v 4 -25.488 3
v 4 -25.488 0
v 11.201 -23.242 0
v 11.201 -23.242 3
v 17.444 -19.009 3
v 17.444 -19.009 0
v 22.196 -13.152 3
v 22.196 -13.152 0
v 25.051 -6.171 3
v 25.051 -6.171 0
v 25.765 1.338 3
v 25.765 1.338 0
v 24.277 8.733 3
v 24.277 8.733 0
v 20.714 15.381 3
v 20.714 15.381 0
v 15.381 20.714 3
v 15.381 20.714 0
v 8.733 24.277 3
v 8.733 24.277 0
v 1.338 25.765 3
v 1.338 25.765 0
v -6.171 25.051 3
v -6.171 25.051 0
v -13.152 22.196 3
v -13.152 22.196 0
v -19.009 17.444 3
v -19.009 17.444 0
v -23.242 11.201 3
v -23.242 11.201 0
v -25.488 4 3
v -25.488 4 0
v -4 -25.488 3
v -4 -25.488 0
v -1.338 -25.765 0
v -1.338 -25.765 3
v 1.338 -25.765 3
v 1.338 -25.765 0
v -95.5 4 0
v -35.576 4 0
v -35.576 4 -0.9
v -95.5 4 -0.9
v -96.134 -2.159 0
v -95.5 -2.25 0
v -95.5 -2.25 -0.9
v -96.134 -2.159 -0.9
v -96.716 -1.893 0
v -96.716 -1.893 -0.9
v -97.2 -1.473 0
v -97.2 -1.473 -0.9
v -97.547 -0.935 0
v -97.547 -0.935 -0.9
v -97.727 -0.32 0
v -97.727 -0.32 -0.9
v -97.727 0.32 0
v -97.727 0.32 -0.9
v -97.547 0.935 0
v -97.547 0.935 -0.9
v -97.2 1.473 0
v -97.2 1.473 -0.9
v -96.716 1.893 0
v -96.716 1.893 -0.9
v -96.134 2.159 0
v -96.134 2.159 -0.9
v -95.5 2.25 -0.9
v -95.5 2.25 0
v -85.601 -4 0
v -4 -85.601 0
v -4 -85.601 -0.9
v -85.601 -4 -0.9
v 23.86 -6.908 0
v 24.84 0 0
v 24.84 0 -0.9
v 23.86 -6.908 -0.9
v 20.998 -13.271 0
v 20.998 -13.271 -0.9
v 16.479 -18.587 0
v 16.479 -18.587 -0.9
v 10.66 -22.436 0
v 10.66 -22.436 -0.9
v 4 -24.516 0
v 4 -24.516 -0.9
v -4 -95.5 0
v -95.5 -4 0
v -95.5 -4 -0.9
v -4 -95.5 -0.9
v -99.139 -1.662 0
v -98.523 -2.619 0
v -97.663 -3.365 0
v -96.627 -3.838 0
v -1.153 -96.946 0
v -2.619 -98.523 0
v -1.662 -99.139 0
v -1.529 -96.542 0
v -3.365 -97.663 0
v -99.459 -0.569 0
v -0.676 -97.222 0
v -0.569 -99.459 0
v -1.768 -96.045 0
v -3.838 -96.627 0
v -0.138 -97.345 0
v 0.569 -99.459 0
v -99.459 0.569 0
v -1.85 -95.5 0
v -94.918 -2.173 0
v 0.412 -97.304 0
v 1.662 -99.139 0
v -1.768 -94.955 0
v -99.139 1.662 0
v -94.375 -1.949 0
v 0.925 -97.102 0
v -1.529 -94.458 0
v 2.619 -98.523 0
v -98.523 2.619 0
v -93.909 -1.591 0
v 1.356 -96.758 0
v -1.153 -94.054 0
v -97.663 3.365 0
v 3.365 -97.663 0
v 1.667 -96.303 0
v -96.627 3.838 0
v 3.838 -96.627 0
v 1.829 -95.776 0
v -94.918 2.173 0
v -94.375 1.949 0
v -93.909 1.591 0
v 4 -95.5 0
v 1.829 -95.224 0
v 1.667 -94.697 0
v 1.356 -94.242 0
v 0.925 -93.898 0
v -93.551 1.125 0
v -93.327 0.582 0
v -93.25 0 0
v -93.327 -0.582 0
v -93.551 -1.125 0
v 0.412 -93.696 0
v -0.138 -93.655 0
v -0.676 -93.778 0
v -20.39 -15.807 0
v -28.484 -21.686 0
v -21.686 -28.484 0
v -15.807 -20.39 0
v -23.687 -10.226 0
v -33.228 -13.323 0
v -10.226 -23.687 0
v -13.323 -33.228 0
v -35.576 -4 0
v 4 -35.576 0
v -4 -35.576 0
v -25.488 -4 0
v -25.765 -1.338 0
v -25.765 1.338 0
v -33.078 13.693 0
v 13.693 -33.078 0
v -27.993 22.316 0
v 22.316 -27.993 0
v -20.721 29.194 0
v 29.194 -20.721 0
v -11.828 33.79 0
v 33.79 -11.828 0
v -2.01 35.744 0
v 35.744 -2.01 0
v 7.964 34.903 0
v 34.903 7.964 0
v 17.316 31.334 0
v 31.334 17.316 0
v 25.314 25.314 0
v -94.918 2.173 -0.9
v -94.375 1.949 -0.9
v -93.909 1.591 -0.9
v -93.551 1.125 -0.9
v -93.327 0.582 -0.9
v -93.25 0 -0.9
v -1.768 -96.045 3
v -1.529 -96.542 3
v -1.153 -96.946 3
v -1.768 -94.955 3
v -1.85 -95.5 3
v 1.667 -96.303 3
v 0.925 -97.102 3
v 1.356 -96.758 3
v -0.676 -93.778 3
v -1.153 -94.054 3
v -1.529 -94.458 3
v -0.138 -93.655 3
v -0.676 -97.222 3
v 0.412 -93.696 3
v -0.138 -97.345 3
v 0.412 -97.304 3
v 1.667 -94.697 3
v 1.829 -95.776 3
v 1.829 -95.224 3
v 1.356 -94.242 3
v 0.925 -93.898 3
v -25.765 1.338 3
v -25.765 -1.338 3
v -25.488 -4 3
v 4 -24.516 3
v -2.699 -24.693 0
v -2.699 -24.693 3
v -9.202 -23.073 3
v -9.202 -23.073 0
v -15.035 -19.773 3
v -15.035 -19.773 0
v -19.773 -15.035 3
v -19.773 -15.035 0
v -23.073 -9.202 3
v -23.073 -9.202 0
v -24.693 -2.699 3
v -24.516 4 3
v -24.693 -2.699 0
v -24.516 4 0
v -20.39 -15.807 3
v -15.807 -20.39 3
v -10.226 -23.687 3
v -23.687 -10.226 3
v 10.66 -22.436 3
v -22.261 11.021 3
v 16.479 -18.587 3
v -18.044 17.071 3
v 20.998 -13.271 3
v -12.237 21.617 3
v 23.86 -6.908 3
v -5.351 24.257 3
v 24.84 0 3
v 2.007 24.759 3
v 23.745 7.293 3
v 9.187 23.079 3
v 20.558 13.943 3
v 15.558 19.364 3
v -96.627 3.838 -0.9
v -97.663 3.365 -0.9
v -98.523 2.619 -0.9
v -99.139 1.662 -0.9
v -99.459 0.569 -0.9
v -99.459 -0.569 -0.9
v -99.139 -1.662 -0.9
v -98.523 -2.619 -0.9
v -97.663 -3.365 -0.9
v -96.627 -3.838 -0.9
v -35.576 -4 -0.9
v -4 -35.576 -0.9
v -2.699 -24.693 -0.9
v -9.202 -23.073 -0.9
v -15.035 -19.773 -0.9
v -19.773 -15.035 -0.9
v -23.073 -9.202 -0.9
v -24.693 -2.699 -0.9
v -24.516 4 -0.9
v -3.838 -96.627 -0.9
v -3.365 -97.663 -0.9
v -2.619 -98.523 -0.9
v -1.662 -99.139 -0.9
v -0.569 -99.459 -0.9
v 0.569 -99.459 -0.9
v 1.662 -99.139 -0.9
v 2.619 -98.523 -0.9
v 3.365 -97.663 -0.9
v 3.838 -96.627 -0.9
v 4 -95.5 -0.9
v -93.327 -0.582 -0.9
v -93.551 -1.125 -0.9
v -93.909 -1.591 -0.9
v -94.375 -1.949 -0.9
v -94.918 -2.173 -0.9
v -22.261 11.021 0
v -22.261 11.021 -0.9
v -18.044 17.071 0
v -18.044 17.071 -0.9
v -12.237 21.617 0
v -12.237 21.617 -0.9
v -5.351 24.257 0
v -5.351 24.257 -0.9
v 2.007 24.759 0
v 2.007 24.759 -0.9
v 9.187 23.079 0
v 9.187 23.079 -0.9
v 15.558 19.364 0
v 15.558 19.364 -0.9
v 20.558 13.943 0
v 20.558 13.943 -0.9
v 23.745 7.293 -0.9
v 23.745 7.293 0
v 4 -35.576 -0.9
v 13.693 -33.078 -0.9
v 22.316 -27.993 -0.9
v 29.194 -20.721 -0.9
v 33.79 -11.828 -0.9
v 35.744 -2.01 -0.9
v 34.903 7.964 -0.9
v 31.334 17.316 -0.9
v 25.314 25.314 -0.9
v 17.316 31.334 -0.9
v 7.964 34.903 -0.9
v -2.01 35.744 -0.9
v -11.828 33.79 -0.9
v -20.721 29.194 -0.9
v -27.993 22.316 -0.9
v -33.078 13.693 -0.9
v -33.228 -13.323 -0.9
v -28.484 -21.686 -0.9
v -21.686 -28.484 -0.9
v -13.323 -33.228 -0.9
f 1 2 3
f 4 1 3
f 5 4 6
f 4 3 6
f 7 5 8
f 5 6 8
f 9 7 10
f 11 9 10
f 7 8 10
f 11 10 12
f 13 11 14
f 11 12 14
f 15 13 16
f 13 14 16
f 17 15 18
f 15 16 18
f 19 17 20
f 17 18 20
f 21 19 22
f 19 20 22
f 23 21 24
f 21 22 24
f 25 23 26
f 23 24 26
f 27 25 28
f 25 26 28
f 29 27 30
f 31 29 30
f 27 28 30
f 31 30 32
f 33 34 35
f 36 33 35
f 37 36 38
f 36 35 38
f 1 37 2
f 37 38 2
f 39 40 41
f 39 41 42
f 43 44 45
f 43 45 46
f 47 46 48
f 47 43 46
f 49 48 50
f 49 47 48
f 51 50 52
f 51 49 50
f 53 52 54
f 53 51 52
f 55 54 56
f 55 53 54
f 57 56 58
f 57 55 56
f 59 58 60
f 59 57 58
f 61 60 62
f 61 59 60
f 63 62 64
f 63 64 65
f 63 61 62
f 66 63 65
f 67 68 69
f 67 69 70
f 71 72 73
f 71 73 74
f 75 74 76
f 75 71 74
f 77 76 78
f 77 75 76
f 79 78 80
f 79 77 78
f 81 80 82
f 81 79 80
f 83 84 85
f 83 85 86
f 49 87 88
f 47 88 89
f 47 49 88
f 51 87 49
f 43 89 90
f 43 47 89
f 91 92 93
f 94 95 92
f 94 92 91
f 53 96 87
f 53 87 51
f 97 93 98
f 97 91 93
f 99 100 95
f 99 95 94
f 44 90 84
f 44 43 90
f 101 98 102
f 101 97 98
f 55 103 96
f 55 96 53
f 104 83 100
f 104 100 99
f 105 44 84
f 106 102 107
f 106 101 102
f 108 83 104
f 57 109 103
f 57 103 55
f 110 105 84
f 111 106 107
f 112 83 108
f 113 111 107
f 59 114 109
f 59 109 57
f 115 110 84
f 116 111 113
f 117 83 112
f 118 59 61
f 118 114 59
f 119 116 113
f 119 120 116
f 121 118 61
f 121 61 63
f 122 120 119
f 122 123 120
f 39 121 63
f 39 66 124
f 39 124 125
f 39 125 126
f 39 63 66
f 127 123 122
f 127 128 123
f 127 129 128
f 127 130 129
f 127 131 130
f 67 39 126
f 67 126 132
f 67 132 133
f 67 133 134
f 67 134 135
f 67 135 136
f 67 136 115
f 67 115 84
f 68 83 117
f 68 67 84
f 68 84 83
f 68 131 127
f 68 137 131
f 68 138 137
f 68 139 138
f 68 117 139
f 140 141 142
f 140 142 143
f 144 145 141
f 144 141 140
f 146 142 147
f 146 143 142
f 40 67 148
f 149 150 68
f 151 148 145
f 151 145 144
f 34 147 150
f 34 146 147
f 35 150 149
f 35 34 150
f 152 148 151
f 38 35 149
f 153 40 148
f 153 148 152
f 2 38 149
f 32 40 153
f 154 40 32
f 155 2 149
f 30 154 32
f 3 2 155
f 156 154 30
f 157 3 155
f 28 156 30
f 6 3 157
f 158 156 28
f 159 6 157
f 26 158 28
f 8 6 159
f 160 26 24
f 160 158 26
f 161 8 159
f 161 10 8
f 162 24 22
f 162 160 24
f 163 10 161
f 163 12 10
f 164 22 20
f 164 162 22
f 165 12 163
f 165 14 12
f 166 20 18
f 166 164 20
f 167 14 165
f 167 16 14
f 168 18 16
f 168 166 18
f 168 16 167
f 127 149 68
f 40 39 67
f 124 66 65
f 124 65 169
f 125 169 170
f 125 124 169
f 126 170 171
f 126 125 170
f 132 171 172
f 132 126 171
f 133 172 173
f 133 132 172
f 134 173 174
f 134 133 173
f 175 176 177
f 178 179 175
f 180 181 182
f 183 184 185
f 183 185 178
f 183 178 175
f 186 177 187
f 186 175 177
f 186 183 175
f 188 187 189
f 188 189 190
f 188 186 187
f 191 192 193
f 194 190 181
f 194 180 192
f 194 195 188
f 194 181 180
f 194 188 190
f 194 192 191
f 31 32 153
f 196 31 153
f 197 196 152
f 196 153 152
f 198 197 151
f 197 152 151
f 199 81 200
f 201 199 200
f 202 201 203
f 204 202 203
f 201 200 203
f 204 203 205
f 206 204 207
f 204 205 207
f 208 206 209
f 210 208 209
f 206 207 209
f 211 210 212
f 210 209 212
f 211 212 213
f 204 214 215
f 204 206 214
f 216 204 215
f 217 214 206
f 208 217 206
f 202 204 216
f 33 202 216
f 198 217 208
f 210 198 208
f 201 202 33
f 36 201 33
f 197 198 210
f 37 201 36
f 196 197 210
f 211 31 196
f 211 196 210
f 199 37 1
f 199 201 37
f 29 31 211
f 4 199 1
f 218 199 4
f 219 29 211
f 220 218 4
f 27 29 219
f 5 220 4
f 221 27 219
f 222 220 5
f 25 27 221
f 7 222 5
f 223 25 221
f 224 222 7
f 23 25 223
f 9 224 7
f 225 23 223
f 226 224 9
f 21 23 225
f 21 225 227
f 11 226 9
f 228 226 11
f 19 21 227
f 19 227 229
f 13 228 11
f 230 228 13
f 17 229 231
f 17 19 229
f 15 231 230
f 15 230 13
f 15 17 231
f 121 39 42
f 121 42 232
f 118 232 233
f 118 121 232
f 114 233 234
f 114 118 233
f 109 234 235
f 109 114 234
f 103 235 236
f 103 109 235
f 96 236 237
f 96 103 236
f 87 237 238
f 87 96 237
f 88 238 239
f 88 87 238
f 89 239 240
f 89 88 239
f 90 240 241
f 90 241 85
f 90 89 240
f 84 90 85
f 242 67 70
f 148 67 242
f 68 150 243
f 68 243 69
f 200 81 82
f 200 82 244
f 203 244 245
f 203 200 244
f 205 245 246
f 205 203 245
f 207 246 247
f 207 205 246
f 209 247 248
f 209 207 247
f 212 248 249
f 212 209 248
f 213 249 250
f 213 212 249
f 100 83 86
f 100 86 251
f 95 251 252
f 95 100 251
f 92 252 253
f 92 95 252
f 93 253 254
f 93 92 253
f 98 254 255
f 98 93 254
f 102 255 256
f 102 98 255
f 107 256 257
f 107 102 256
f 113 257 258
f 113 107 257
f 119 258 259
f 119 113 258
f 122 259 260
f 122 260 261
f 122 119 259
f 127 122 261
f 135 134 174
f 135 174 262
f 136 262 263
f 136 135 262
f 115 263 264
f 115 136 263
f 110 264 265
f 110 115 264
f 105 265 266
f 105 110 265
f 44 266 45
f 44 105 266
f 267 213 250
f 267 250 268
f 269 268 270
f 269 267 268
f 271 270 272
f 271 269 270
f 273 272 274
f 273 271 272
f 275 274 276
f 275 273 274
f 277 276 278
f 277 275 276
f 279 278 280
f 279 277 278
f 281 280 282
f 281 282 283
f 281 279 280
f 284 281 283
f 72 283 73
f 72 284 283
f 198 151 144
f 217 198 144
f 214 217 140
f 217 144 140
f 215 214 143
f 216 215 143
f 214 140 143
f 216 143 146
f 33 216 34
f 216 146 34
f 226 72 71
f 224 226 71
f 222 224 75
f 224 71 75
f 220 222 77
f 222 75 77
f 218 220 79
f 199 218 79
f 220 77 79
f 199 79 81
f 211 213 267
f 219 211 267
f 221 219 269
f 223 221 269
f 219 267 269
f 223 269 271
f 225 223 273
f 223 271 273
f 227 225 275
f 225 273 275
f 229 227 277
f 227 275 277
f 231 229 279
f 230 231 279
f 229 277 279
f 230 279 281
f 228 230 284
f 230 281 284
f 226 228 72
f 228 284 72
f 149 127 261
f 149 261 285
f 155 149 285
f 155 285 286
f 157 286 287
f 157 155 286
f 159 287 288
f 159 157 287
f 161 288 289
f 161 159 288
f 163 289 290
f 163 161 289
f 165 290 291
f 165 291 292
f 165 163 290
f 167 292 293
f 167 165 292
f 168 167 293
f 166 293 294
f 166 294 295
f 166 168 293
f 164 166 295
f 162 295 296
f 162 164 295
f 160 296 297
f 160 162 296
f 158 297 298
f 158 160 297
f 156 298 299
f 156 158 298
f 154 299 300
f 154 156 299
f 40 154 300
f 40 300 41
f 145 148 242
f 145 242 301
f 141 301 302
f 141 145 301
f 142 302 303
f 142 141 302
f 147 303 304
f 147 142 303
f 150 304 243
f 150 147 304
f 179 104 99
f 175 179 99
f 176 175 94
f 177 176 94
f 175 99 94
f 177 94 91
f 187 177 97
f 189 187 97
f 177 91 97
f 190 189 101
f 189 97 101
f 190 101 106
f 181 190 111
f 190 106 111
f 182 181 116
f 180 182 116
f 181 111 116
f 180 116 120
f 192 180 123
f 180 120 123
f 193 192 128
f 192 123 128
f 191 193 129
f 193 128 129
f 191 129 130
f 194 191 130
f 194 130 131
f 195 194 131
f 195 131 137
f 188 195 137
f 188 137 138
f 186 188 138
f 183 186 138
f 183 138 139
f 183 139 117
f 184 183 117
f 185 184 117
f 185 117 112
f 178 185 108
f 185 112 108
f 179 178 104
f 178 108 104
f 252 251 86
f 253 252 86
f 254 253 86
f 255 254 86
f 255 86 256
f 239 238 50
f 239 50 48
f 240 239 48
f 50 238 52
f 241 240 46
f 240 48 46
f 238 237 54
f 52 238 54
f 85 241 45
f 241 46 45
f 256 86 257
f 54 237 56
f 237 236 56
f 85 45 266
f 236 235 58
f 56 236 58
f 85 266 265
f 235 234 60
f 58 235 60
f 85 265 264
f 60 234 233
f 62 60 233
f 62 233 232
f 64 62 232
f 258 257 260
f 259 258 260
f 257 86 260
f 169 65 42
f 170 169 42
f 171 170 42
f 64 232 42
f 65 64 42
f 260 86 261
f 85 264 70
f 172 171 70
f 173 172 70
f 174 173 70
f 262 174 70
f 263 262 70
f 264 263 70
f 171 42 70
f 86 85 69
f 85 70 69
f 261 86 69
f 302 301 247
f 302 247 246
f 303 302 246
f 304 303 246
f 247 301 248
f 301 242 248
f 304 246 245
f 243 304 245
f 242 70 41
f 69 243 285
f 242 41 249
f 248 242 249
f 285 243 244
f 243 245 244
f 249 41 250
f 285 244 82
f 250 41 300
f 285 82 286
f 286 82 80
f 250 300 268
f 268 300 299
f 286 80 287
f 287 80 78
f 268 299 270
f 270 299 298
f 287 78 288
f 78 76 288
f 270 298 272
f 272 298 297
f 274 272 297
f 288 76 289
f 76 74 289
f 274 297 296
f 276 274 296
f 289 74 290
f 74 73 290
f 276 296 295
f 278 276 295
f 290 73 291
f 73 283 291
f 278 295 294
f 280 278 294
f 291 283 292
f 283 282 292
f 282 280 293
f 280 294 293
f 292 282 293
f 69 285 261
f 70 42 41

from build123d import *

# Parameters (mm, degrees)
F1_DEPTH = 0.9
F2_DEPTH = 3
F3_DEPTH = 3


with BuildPart() as f1:
    # F0 (on Top) → F1 (new body)
    with BuildSketch(Plane.XY):
        with BuildLine():
            Line((-35.5758344948, 4), (-95.5, 4))
            ThreePointArc((-95.5, 4), (-92.6715728753, 2.8284271247), (-91.5, 0))
            ThreePointArc((-91.5, 0), (-92.6715728753, -2.8284271247), (-95.5, -4))
            Line((-95.5, -4), (-85.6005050634, -4))
            Line((-85.6005050634, -4), (-35.5758344948, -4))
            ThreePointArc((-35.5758344948, -4), (-35.8, 0), (-35.5758344948, 4))
        make_face()
        with BuildLine():
            ThreePointArc((-95.5, 2.25), (-93.9090097423, 1.5909902577), (-93.25, 0))
            ThreePointArc((-93.25, 0), (-93.9090097423, -1.5909902577), (-95.5, -2.25))
            Line((-95.5, -2.25), (-95.5, -4))
            ThreePointArc((-95.5, -4), (-92.6715728753, -2.8284271247), (-91.5, 0))
            ThreePointArc((-91.5, 0), (-92.6715728753, 2.8284271247), (-95.5, 4))
            Line((-95.5, 4), (-95.5, 2.25))
        make_face()
        with BuildLine():
            ThreePointArc((-95.5, -2.25), (-97.75, 0), (-95.5, 2.25))
            Line((-95.5, 2.25), (-95.5, 4))
            ThreePointArc((-95.5, 4), (-99.5, 0), (-95.5, -4))
            Line((-95.5, -4), (-95.5, -2.25))
        make_face()
        Polygon((-85.6005050634, -4), (-95.5, -4), (-4, -95.5), (-4, -85.6005050634), align=None)
        with BuildLine():
            Line((-1.85, -95.5), (-4, -95.5))
            ThreePointArc((-4, -95.5), (0, -99.5), (4, -95.5))
            Line((4, -95.5), (1.85, -95.5))
            ThreePointArc((1.85, -95.5), (0, -97.35), (-1.85, -95.5))
        make_face()
        with BuildLine():
            ThreePointArc((4, -95.5), (0, -91.5), (-4, -95.5))
            Line((-4, -95.5), (-1.85, -95.5))
            ThreePointArc((-1.85, -95.5), (0, -93.65), (1.85, -95.5))
            Line((1.85, -95.5), (4, -95.5))
        make_face()
        with BuildLine():
            Line((1.85, -95.5), (-1.85, -95.5))
            ThreePointArc((-1.85, -95.5), (0, -97.35), (1.85, -95.5))
        make_face()
        with BuildLine():
            ThreePointArc((1.85, -95.5), (0, -93.65), (-1.85, -95.5))
            Line((-1.85, -95.5), (1.85, -95.5))
        make_face()
        with BuildLine():
            Line((-4, -85.6005050634), (-4, -95.5))
            ThreePointArc((-4, -95.5), (0, -91.5), (4, -95.5))
            Line((4, -95.5), (4, -35.5758344948))
            ThreePointArc((4, -35.5758344948), (0, -35.8), (-4, -35.5758344948))
            Line((-4, -35.5758344948), (-4, -85.6005050634))
        make_face()
        with BuildLine():
            Line((-25.4880364093, -4), (-35.5758344948, -4))
            ThreePointArc((-35.5758344948, -4), (-25.3144227665, -25.3144227665), (-4, -35.5758344948))
            Line((-4, -35.5758344948), (-4, -25.4880364093))
            ThreePointArc((-4, -25.4880364093), (-18.2433549546, -18.2433549546), (-25.4880364093, -4))
        make_face()
        with BuildLine():
            Line((-25.4880364093, 4), (-35.5758344948, 4))
            ThreePointArc((-35.5758344948, 4), (-35.8, 0), (-35.5758344948, -4))
            Line((-35.5758344948, -4), (-25.4880364093, -4))
            ThreePointArc((-25.4880364093, -4), (-25.8, 0), (-25.4880364093, 4))
        make_face()
        with BuildLine():
            ThreePointArc((35.8, 0), (2.0031381738, 35.7439146913), (-35.5758344948, 4))
            Line((-35.5758344948, 4), (-25.4880364093, 4))
            ThreePointArc((-25.4880364093, 4), (2.0060733587, 25.7218908652), (25.8, 0))
            ThreePointArc((25.8, 0), (19.6066315312, -16.7696153802), (4, -25.4880364093))
            Line((4, -25.4880364093), (4, -35.5758344948))
            ThreePointArc((4, -35.5758344948), (26.6911970507, -23.858331878), (35.8, 0))
        make_face()
        with BuildLine():
            ThreePointArc((-4, -35.5758344948), (0, -35.8), (4, -35.5758344948))
            Line((4, -35.5758344948), (4, -25.4880364093))
            ThreePointArc((4, -25.4880364093), (0, -25.8), (-4, -25.4880364093))
            Line((-4, -25.4880364093), (-4, -35.5758344948))
        make_face()
        with BuildLine():
            Line((-24.5158234616, -4), (-25.4880364093, -4))
            ThreePointArc((-25.4880364093, -4), (-18.2433549546, -18.2433549546), (-4, -25.4880364093))
            Line((-4, -25.4880364093), (-4, -24.5158234616))
            ThreePointArc((-4, -24.5158234616), (-17.5645324447, -17.5645324447), (-24.5158234616, -4))
        make_face()
        with BuildLine():
            Line((-24.5158234616, 4), (-25.4880364093, 4))
            ThreePointArc((-25.4880364093, 4), (-25.8, 0), (-25.4880364093, -4))
            Line((-25.4880364093, -4), (-24.5158234616, -4))
            ThreePointArc((-24.5158234616, -4), (-24.84, 0), (-24.5158234616, 4))
        make_face()
        with BuildLine():
            ThreePointArc((25.8, 0), (2.0060733587, 25.7218908652), (-25.4880364093, 4))
            Line((-25.4880364093, 4), (-24.5158234616, 4))
            ThreePointArc((-24.5158234616, 4), (2.0065574019, 24.7588232231), (24.84, 0))
            ThreePointArc((24.84, 0), (18.925982141, -16.0882814496), (4, -24.5158234616))
            Line((4, -24.5158234616), (4, -25.4880364093))
            ThreePointArc((4, -25.4880364093), (19.6066315312, -16.7696153802), (25.8, 0))
        make_face()
        with BuildLine():
            ThreePointArc((-4, -25.4880364093), (0, -25.8), (4, -25.4880364093))
            Line((4, -25.4880364093), (4, -24.5158234616))
            ThreePointArc((4, -24.5158234616), (0, -24.84), (-4, -24.5158234616))
            Line((-4, -24.5158234616), (-4, -25.4880364093))
        make_face()
    extrude(amount=-F1_DEPTH)

    # F0 (on Top) → F2 (join)
    with BuildSketch(Plane.XY):
        with BuildLine():
            ThreePointArc((25.8, 0), (2.0060733587, 25.7218908652), (-25.4880364093, 4))
            Line((-25.4880364093, 4), (-24.5158234616, 4))
            ThreePointArc((-24.5158234616, 4), (2.0065574019, 24.7588232231), (24.84, 0))
            ThreePointArc((24.84, 0), (18.925982141, -16.0882814496), (4, -24.5158234616))
            Line((4, -24.5158234616), (4, -25.4880364093))
            ThreePointArc((4, -25.4880364093), (19.6066315312, -16.7696153802), (25.8, 0))
        make_face()
        with BuildLine():
            Line((-24.5158234616, 4), (-25.4880364093, 4))
            ThreePointArc((-25.4880364093, 4), (-25.8, 0), (-25.4880364093, -4))
            Line((-25.4880364093, -4), (-24.5158234616, -4))
            ThreePointArc((-24.5158234616, -4), (-24.84, 0), (-24.5158234616, 4))
        make_face()
        with BuildLine():
            Line((-24.5158234616, -4), (-25.4880364093, -4))
            ThreePointArc((-25.4880364093, -4), (-18.2433549546, -18.2433549546), (-4, -25.4880364093))
            Line((-4, -25.4880364093), (-4, -24.5158234616))
            ThreePointArc((-4, -24.5158234616), (-17.5645324447, -17.5645324447), (-24.5158234616, -4))
        make_face()
        with BuildLine():
            ThreePointArc((-4, -25.4880364093), (0, -25.8), (4, -25.4880364093))
            Line((4, -25.4880364093), (4, -24.5158234616))
            ThreePointArc((4, -24.5158234616), (0, -24.84), (-4, -24.5158234616))
            Line((-4, -24.5158234616), (-4, -25.4880364093))
        make_face()
    extrude(amount=F2_DEPTH)

    # F0 (on Top) → F3 (join)
    with BuildSketch(Plane.XY):
        with BuildLine():
            ThreePointArc((1.85, -95.5), (0, -93.65), (-1.85, -95.5))
            Line((-1.85, -95.5), (1.85, -95.5))
        make_face()
        with BuildLine():
            Line((1.85, -95.5), (-1.85, -95.5))
            ThreePointArc((-1.85, -95.5), (0, -97.35), (1.85, -95.5))
        make_face()
    extrude(amount=F3_DEPTH)


solid = f1.part
